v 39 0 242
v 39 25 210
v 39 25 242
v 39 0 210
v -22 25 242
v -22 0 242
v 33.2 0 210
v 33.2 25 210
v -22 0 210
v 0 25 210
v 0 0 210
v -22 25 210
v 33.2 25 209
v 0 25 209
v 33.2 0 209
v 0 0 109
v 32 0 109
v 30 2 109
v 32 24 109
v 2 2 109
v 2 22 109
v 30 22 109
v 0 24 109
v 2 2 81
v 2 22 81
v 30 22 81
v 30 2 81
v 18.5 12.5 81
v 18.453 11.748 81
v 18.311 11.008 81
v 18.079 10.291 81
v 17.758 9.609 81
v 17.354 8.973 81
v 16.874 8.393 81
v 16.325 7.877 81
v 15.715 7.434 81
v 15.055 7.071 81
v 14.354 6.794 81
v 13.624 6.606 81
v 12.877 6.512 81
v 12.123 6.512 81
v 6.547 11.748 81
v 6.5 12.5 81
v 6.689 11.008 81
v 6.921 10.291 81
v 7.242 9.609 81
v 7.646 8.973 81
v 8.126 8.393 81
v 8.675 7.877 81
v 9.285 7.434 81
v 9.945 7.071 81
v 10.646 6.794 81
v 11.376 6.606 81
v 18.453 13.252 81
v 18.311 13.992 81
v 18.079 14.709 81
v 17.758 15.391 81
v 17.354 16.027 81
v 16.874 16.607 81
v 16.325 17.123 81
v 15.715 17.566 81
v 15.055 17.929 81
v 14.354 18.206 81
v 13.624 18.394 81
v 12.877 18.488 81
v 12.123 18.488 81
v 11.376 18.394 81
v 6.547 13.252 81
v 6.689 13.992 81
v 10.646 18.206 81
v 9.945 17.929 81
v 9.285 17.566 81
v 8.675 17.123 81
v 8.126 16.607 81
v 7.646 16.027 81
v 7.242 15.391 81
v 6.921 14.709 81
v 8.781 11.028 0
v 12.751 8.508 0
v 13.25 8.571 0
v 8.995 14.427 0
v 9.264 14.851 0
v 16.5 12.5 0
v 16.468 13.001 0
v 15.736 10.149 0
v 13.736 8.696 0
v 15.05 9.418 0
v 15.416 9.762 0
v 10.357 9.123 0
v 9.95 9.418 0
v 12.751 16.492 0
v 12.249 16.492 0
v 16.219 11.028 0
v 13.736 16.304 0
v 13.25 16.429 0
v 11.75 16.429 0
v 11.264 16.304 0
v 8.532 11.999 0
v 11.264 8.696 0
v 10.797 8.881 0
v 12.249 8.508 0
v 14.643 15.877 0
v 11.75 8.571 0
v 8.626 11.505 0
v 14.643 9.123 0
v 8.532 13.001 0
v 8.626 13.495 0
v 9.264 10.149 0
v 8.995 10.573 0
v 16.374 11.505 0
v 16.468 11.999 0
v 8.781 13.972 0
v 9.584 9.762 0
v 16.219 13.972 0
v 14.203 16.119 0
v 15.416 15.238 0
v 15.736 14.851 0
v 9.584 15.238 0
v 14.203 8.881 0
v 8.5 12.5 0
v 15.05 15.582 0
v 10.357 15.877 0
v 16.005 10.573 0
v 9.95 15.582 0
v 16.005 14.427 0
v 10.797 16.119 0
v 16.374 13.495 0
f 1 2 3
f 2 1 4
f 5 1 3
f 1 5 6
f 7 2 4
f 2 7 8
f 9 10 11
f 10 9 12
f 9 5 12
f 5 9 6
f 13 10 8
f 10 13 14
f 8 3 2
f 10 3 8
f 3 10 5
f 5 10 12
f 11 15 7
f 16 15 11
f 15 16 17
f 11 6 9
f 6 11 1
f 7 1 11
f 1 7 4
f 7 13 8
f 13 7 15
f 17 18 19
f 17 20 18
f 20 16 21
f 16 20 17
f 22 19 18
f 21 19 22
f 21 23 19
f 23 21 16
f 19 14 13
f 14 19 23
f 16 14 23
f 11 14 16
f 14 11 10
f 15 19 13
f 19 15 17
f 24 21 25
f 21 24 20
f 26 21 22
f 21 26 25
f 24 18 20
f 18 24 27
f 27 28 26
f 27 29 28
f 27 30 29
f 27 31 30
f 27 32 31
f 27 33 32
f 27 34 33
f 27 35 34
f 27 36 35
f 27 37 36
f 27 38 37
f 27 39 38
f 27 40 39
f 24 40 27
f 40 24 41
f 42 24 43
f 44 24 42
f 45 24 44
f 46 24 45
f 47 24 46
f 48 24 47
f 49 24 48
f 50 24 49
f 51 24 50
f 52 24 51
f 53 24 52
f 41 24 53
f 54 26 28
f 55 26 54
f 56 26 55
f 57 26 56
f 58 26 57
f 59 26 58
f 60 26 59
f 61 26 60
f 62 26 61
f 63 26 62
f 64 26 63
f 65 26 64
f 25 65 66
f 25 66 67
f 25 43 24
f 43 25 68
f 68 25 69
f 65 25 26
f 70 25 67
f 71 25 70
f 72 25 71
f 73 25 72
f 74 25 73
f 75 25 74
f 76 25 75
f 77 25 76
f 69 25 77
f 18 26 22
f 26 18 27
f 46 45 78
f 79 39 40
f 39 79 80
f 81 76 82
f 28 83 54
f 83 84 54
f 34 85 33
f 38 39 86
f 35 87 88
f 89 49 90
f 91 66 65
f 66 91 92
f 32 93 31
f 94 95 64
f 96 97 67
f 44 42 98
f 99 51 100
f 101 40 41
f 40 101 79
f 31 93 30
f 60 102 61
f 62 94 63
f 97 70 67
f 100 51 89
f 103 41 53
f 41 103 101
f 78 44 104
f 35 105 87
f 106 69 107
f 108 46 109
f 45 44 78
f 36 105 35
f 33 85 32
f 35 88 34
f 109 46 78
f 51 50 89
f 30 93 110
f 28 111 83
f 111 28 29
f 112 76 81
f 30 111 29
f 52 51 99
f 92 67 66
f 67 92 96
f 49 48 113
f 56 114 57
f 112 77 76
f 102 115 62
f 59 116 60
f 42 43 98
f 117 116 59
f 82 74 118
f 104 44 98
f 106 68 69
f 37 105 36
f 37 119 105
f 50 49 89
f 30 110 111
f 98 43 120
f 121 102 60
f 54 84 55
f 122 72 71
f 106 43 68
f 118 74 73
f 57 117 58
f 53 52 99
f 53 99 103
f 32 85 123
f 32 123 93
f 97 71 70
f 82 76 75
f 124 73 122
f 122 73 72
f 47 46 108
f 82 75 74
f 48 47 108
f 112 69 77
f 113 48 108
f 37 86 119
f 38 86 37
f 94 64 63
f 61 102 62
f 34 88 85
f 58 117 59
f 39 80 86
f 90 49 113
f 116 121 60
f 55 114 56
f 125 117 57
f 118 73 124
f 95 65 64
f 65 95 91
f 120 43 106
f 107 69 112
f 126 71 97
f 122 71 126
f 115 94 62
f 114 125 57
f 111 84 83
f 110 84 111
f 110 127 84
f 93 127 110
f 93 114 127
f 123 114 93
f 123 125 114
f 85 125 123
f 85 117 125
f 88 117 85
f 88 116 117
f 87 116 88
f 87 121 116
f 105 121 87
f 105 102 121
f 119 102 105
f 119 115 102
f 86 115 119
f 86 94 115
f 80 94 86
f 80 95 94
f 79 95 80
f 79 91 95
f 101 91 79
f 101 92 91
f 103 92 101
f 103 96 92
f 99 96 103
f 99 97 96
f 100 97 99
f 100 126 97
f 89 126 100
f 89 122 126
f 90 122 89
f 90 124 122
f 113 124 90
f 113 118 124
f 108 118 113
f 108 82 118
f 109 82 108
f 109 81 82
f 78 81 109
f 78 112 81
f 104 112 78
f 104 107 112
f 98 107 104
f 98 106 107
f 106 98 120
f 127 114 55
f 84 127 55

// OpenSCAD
// file: cnc_params.scad
$fn = 50;

wall = 3;

rod_d = 12;
rod_sz = 152;
rod_bearing_d = 21;
rod_bearing_sz = 30;
rod_rod_dist = 34+rod_bearing_d;
rod_bearing_pos_z = [15+12/2, 15 + 12/2 + rod_rod_dist + 12/2];
lead_screw_d = 8;
lead_screw_bearing_d = 22;
lead_screw_bearing_sz = 7;
lead_screw_nut_d = 10.6;
lead_screw_nut_pos_z = rod_bearing_pos_z[0] + 20.5 + 8/2 + 12/2;
lead_screw_nut_hole_d = 2.4;
lead_screw_nut_hole_r_dist = 8;
lead_screw_nut_attach_plate_d = 22.4;

echo("rod 1-lead ", lead_screw_nut_pos_z-rod_bearing_pos_z[0], ", lead to  rod2 ", lead_screw_nut_pos_z - rod_bearing_pos_z[1]);

base_sz_x = rod_bearing_sz * 2 + 2 * wall;
base_sz_y = rod_bearing_d + 6; // shortest
base_sz_z = rod_sz+wall*2;

//28 65
echo("base x: ", base_sz_x, ", base y:", base_sz_y);

hole_d = 3.8;
hole_d_through = 4.4;
mounting_hole_offset = 5;

motor_sz = 43;
motor_d = 24;
motor_hole_dist = 30.2;
rod_distance = 66.2 - rod_bearing_d; //rod_distance/2 = 23.25??? (66.2 - 21)/2 = 45.2/2 = 22.6 !!!
// motor shift from rod axis
motor_shift_y = 5;

top_block_sz_x = base_sz_x + 2 * wall;
top_block_sz_y = motor_sz + 4 * wall + base_sz_y;
top_block_sz_z = 10;

bottom_block_sz_x = top_block_sz_x;
bottom_block_sz_y = top_block_sz_y - 10;
bottom_block_sz_z = lead_screw_bearing_sz + wall;

// ganztry_z params

gantry_sz_x = base_sz_x;
gantry_sz_y = rod_bearing_d + 2 * wall;
gantry_sz_z = rod_bearing_sz * 2 + 4;

attach_sz_x = 4;
attach_sz_y = 25;
attach_sz_z = gantry_sz_z-10;

extract_sz_x = lead_screw_nut_attach_plate_d + 2 * wall;
extract_sz_y = extract_sz_x;
extract_sz_z = gantry_sz_z - 15;

rod_dist_x = 67.4 - rod_bearing_d;

attach_side_gap = 0.5;

connector_base_sz_x = gantry_sz_x-rod_bearing_d-attach_sz_x-2*attach_side_gap;
connector_base_sz_y = 12;
connector_connector_sz_x = 5;
default_attach_extra_sz_y = 15;

gantry_z_to_work_surface_sz_z = 56;

nuts_sz_z = 2;

//////////////////////// duratech drill mockup
top_d = 23;
top_sz_z = 37;
above_widest_level_d = 36;
above_widest_level_sz_z = 50;
widest_level_d = 37;
widest_level_sz_z = 7.8;

above_bottom_box_sz_x = 17;
above_bottom_box_sz_y = 11;
above_bottom_box_sz_z = 14;

above_bottom_d = 29;
above_bottom_sz_z = 9.5;
bottom_d = 22.5;
bottom_sz_z = 7.5;

metal_thing_d  = 10.2;
metal_thing_sz_z = 11;
metal_cone_bottom_d = 7.4;
metal_cone_bottom_sz_z = 3;

drill_bit_sz_z = 20;
drill_bit_d = 2;
//////////////////////////


//////////////////////// dragonlab pipette mockup
pipette_wall = 2;
pipette_bottom_holder_sz_x = 32;
pipette_bottom_holder_sz_y = 24;
pipette_bottom_holder_sz_z = 15;
//////////////////////////
// main file
include <cnc_params.scad>


module pipette_mockup() {
	translate([0, 0, 81]) {
		translate([0, 0, 28]) {
			translate([-22, 0, 101]) {
				cube([39+22, 25, 32]);
			}
			hull() {
				translate([0, 0, 100]) {
					cube([33.2, 25, 1]);
				}
				cube([pipette_bottom_holder_sz_x, pipette_bottom_holder_sz_y, 1]);
			}
		}
		translate([pipette_wall, pipette_wall, 0]) {
			hull() {
				translate([0, 0, 28]) {
					cube([pipette_bottom_holder_sz_x-2*pipette_wall, pipette_bottom_holder_sz_y-2*pipette_wall, 1]);
				}
				cube([pipette_bottom_holder_sz_x-2*pipette_wall, pipette_bottom_holder_sz_y-2*pipette_wall, 1]);
			}
		}
	}
	translate([pipette_wall+4.5+6, pipette_wall+4.5+6, 0]) {
		cylinder(d2=12, d1=8, h=81);
	}
}

pipette_mockup();
